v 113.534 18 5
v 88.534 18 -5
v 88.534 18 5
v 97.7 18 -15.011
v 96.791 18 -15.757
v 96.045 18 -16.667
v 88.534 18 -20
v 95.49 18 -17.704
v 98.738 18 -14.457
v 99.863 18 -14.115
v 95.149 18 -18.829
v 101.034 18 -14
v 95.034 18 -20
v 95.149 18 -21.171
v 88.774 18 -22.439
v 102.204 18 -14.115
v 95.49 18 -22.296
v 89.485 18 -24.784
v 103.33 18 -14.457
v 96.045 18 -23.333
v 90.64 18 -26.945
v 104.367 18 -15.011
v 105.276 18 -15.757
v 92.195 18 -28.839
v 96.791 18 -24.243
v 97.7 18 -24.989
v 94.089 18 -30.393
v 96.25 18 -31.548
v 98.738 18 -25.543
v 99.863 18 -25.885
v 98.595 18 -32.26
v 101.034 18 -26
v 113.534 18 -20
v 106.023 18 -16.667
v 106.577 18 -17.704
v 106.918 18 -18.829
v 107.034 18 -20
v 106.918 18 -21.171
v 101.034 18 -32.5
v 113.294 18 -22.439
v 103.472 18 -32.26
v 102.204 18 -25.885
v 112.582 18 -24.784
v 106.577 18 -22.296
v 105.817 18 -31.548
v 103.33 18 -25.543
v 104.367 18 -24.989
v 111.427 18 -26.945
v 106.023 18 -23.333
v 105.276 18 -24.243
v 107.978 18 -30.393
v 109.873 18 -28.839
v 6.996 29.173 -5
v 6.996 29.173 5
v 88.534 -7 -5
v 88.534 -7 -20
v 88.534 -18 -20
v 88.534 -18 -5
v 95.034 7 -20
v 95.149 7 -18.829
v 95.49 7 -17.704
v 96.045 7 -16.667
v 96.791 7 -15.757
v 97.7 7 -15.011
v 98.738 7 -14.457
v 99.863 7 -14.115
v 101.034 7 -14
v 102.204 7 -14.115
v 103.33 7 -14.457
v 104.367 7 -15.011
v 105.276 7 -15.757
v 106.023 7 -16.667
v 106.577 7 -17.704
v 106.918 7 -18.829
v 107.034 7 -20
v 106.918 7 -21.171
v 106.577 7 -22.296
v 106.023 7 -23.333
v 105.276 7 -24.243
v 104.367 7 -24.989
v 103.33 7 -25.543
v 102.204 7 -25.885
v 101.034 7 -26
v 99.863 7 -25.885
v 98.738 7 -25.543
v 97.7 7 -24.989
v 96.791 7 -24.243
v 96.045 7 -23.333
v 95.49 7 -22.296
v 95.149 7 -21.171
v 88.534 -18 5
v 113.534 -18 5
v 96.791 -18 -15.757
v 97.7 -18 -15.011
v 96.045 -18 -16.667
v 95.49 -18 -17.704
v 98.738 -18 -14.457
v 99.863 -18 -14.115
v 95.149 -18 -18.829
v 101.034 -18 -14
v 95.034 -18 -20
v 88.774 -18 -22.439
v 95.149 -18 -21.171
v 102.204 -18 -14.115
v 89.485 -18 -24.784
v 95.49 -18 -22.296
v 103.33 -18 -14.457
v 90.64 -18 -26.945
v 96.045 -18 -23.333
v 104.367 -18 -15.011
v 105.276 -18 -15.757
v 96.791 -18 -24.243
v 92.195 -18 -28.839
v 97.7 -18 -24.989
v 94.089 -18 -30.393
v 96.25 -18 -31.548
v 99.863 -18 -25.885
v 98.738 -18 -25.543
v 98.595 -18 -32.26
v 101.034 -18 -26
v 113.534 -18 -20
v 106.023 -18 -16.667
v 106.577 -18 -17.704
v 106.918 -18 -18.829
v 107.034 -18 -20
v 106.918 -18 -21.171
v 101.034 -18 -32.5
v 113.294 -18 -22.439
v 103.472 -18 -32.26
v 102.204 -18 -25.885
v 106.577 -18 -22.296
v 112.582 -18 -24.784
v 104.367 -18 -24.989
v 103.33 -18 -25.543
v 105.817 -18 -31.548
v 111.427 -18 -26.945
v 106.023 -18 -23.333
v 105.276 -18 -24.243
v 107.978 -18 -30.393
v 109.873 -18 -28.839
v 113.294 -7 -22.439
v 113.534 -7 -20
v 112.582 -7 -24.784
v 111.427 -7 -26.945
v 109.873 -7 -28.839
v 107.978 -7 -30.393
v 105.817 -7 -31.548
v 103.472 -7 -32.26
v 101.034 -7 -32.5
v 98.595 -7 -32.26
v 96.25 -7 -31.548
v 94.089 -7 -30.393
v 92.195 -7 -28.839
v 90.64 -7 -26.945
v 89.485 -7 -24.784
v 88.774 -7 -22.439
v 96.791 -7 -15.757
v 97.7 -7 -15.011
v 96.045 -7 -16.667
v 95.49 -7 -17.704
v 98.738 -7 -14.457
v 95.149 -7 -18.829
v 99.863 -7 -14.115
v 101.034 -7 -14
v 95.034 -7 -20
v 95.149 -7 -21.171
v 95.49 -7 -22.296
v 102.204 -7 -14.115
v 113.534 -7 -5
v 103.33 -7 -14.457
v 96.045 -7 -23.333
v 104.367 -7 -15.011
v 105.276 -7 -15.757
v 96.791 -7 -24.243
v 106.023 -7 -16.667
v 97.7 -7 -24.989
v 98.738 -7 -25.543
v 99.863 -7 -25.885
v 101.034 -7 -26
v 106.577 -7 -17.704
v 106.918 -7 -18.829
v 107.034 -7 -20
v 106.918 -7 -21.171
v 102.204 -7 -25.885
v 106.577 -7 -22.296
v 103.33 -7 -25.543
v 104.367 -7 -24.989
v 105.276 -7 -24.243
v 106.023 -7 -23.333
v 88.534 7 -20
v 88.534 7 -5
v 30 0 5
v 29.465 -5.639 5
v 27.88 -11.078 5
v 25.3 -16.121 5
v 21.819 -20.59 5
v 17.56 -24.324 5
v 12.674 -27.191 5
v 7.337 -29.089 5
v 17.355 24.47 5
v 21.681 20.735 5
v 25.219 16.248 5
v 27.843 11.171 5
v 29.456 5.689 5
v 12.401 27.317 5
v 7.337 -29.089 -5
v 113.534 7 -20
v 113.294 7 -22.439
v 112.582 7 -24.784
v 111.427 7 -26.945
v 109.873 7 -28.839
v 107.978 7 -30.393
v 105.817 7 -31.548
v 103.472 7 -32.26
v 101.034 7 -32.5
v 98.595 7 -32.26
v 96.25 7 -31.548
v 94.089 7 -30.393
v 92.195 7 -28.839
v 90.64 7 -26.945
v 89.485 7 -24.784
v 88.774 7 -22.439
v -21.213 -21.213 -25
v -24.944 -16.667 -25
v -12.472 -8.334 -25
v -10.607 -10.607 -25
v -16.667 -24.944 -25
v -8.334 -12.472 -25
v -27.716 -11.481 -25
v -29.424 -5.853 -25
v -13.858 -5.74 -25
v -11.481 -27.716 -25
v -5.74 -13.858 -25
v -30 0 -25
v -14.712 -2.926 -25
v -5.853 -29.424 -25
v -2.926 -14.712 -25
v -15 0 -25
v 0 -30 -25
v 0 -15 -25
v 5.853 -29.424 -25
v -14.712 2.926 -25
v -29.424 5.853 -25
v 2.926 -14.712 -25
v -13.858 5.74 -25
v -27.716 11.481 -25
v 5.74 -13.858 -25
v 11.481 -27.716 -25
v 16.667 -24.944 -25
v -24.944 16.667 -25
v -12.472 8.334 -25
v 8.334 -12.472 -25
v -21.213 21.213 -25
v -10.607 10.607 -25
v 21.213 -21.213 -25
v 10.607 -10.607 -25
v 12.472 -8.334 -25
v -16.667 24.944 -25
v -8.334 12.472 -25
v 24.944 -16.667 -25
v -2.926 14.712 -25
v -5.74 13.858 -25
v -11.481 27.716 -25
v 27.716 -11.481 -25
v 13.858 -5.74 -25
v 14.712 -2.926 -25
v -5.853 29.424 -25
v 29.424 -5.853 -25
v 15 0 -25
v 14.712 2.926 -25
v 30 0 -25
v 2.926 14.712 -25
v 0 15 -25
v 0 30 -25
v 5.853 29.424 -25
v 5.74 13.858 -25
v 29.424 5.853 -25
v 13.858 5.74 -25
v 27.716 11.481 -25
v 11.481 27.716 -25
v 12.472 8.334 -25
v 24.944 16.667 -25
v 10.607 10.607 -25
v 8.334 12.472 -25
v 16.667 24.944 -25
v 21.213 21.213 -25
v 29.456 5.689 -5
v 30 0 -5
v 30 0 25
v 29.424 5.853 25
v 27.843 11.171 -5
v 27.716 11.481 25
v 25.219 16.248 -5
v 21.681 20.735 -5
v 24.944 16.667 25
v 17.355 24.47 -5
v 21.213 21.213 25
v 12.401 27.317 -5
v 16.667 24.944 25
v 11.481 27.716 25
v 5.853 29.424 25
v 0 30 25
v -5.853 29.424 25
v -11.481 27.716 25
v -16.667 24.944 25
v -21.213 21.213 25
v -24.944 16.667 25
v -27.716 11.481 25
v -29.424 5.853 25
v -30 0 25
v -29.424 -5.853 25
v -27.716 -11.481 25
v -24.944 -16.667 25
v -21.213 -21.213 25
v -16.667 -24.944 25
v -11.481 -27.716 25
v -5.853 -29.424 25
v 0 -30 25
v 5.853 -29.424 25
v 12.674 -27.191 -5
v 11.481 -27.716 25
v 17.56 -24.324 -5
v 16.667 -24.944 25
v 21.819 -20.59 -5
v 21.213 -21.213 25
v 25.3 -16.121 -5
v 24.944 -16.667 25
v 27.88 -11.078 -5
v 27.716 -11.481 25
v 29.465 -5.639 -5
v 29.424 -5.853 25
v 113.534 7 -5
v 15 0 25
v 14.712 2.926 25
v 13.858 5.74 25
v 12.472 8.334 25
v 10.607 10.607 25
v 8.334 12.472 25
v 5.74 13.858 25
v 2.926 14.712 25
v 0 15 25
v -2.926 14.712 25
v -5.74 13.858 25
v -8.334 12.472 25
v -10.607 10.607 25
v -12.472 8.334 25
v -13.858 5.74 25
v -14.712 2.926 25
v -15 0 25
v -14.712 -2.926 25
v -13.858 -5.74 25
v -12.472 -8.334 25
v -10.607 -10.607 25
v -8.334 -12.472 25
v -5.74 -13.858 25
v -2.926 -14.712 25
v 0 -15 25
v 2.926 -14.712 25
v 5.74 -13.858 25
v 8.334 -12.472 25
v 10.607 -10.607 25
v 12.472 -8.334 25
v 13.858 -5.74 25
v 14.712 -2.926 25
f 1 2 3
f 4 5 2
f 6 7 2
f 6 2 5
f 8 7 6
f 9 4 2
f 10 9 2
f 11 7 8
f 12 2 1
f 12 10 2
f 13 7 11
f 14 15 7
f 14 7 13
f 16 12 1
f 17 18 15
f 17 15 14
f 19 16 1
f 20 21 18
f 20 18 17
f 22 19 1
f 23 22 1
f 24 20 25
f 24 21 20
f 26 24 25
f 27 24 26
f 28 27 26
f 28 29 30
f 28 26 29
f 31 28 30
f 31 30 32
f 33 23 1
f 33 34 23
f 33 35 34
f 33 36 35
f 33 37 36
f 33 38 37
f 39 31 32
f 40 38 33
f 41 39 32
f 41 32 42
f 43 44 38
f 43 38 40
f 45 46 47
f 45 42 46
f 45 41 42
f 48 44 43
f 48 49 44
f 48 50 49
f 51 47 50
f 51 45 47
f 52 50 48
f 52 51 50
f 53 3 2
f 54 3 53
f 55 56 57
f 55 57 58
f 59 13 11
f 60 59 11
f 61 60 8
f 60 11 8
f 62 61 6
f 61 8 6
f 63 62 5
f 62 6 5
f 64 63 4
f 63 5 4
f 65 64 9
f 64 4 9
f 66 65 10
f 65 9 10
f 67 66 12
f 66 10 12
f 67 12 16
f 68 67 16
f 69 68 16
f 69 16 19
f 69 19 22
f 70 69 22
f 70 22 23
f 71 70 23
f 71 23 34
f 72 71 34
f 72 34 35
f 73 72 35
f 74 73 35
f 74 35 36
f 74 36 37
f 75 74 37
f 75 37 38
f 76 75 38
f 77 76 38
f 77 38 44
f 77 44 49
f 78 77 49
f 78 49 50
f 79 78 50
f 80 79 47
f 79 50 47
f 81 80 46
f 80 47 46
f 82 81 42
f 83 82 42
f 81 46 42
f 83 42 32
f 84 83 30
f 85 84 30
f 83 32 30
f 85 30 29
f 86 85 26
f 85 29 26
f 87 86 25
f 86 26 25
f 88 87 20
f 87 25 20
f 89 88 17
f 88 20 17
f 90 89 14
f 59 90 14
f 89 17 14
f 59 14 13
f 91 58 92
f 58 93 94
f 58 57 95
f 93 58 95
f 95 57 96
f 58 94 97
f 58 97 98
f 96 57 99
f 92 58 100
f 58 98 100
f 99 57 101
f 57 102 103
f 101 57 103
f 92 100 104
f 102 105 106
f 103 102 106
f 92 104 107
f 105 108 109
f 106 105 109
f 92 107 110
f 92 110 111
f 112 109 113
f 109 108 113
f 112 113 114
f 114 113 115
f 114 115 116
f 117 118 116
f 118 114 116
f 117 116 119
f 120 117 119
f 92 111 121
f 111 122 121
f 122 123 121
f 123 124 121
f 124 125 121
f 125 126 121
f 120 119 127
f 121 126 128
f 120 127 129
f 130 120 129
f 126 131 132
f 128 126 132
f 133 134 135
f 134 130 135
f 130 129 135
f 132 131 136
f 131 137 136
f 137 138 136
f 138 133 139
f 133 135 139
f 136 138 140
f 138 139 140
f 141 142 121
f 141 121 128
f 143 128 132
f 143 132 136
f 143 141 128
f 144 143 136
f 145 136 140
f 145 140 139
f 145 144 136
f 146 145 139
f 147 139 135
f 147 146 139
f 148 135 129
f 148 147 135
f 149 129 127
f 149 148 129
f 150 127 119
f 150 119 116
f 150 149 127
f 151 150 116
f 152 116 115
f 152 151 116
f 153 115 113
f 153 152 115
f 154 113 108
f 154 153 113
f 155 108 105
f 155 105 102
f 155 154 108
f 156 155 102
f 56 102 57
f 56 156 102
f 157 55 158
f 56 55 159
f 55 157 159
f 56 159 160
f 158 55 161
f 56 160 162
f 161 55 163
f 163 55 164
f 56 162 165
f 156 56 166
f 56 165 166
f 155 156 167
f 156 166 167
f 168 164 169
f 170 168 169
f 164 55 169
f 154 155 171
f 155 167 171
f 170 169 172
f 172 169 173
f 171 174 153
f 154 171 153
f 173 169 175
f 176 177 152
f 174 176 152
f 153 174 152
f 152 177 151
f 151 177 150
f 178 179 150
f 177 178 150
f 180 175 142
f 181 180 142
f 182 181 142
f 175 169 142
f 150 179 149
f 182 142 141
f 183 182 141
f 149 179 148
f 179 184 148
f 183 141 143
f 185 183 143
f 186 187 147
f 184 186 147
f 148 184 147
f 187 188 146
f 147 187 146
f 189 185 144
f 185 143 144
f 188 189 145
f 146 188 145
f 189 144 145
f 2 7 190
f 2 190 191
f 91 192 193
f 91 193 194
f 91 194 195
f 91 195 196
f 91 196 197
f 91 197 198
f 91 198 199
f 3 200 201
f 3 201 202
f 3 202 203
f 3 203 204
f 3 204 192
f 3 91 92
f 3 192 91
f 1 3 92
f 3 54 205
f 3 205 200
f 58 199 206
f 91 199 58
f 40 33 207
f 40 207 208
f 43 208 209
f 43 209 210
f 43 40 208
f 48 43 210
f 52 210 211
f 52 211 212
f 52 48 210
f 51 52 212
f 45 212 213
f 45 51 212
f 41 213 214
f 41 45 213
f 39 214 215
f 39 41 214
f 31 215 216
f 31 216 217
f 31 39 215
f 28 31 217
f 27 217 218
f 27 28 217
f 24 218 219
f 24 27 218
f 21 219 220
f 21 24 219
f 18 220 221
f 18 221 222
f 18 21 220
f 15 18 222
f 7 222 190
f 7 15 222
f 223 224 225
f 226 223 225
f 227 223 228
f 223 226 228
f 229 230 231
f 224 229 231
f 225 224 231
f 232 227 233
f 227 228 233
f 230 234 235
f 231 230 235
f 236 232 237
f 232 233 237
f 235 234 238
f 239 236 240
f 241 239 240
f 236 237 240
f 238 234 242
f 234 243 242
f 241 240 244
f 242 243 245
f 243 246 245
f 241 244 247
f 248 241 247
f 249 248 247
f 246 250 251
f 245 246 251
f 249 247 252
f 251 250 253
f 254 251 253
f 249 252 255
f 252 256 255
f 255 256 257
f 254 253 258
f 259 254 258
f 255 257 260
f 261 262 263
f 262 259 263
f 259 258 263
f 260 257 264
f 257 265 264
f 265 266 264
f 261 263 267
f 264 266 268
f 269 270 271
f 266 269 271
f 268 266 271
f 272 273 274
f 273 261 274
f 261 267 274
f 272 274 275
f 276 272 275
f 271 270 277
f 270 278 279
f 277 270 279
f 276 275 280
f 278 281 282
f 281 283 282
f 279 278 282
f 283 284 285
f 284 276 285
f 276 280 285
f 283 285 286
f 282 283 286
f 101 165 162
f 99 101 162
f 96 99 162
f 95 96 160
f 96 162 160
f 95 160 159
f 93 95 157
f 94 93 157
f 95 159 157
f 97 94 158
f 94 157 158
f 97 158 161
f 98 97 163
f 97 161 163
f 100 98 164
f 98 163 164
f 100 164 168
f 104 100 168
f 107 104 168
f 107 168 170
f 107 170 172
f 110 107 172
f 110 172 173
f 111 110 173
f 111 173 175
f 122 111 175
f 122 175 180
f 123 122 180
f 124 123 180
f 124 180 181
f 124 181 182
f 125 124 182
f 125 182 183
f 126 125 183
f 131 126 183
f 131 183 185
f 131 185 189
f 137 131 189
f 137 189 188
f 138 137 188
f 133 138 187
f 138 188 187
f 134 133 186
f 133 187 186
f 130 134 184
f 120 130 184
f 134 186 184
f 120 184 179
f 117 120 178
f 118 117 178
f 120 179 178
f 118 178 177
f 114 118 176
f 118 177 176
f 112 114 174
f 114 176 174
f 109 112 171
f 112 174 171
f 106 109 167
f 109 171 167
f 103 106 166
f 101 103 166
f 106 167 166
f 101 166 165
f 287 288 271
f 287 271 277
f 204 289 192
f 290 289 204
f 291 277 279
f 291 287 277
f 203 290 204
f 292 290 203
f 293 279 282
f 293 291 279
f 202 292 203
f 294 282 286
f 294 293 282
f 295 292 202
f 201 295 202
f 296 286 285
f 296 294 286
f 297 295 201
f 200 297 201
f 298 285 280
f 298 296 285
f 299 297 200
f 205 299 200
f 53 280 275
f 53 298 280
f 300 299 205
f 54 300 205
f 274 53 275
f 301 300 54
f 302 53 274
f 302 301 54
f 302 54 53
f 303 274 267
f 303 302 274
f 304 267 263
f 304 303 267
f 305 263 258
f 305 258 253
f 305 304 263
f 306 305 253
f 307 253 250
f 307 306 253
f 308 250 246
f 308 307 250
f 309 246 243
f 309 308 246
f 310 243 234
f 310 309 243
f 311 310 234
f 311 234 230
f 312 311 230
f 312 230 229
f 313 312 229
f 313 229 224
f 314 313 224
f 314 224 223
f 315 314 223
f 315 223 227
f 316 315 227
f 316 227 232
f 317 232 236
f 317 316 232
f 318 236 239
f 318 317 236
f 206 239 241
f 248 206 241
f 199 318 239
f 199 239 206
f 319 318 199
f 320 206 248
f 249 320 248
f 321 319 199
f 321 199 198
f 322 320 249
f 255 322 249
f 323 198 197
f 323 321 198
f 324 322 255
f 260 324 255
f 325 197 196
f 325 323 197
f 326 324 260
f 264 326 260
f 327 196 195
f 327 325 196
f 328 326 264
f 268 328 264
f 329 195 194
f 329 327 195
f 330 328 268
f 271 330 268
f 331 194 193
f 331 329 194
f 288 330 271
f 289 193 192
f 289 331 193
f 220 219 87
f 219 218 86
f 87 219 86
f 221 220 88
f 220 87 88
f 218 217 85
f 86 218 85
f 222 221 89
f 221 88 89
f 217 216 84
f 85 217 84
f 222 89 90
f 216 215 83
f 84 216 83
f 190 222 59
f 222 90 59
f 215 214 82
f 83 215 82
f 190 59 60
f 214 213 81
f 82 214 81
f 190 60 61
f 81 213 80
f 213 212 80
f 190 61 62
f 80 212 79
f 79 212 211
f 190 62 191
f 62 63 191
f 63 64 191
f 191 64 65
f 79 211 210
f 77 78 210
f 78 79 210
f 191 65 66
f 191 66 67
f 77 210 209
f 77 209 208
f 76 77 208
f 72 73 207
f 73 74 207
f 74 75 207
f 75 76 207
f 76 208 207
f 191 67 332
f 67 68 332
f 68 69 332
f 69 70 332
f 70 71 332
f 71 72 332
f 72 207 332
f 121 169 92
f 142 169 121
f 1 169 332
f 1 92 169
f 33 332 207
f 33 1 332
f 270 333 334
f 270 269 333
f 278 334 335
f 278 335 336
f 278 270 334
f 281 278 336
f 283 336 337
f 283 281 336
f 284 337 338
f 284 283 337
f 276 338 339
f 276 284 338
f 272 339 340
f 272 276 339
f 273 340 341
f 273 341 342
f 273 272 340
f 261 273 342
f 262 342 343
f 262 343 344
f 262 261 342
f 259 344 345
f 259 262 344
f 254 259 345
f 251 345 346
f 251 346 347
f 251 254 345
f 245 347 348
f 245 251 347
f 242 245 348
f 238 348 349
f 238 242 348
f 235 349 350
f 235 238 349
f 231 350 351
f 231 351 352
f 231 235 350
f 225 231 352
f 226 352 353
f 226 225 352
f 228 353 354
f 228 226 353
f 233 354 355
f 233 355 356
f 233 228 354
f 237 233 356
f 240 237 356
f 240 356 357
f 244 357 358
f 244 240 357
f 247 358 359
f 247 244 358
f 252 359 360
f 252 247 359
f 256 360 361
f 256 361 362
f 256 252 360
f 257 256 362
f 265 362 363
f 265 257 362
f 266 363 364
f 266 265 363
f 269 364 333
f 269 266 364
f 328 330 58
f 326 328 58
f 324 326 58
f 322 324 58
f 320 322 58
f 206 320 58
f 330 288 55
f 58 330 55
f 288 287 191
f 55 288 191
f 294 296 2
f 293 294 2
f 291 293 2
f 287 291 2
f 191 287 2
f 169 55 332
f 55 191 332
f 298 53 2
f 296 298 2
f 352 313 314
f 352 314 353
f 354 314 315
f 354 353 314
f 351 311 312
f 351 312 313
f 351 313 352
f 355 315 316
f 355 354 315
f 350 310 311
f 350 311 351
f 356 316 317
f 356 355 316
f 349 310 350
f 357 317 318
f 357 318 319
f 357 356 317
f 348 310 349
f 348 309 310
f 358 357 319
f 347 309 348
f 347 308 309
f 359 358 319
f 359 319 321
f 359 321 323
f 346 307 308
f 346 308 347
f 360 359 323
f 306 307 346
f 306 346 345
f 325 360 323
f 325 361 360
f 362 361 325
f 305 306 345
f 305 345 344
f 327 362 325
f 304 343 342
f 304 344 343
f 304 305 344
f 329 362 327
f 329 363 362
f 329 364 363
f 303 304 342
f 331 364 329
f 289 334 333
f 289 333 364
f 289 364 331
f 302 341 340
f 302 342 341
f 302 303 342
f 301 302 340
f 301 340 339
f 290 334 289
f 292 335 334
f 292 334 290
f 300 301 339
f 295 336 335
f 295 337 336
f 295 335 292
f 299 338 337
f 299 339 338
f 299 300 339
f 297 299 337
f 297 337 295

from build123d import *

# Parameters (mm, degrees)
SKETCH2_R           = 30
SKETCH2_R_2         = 15
BOSS_EXTRUDE1_DEPTH = 25
BOSS_EXTRUDE2_DEPTH = 5
SKETCH4_R           = 6
BOSS_EXTRUDE3_DEPTH = 36
SKETCH5_W           = 15
SKETCH5_H           = 7
CUT_EXTRUDE1_DEPTH  = 36


with BuildPart() as part:
    # Sketch2 → Boss-Extrude1 (new body, symmetric)
    with BuildSketch(Plane.XY):
        Circle(SKETCH2_R)
        Circle(SKETCH2_R_2, mode=Mode.SUBTRACT)
    extrude(amount=BOSS_EXTRUDE1_DEPTH, both=True)

    # Sketch3 → Boss-Extrude2 (add, symmetric)
    with BuildSketch(Plane.XY):
        with BuildLine():
            Line((113.533737607, 0), (113.533737607, 18))
            Line((113.533737607, 18), (88.533737607, 18))
            Line((88.533737607, 18), (6.995589774, 29.172962203))
            ThreePointArc((6.995589774, 29.172962203), (29.999485022, 0.175779521), (7.336970855, -29.08898174))
            Line((7.336970855, -29.08898174), (88.533737607, -18))
            Line((88.533737607, -18), (113.533737607, -18))
            Line((113.533737607, -18), (113.533737607, 0))
        make_face()
    extrude(amount=BOSS_EXTRUDE2_DEPTH, both=True)

    # Sketch4 → Boss-Extrude3 (add)
    with BuildSketch(Plane(origin=(0, 18, 0), x_dir=(1, 0, 0), z_dir=(0, 1, 0))):
        with BuildLine():
            Line((88.533737607, 20), (88.533737607, 5))
            Line((88.533737607, 5), (113.533737607, 5))
            Line((113.533737607, 5), (113.533737607, 20))
            ThreePointArc((113.533737607, 20), (101.033737607, 32.5), (88.533737607, 20))
        make_face()
        with Locations(Location((101.033737607, 20, 0), (0, 0, 180))):  # turned: the seam where the file's is
            Circle(SKETCH4_R, mode=Mode.SUBTRACT)
    extrude(amount=-BOSS_EXTRUDE3_DEPTH)

    # Sketch5 → Cut-Extrude1 (cut)
    with BuildSketch(Plane(origin=(113.533737607, 0, 0), x_dir=(0, 0, -1), z_dir=(1, 0, 0))):
        with Locations((12.5, -3.5)):
            Rectangle(SKETCH5_W, SKETCH5_H)
        with Locations((12.5, 3.5)):
            Rectangle(SKETCH5_W, SKETCH5_H)
        Polygon((20, 7), (20, 0), (31.178860048, 0), (40, 0), (40, 7), align=None)
        Polygon((31.178860048, 0), (20, 0), (20, -7), (40, -7), (40, 0), align=None)
    extrude(amount=-CUT_EXTRUDE1_DEPTH, mode=Mode.SUBTRACT)


solid = part.part
